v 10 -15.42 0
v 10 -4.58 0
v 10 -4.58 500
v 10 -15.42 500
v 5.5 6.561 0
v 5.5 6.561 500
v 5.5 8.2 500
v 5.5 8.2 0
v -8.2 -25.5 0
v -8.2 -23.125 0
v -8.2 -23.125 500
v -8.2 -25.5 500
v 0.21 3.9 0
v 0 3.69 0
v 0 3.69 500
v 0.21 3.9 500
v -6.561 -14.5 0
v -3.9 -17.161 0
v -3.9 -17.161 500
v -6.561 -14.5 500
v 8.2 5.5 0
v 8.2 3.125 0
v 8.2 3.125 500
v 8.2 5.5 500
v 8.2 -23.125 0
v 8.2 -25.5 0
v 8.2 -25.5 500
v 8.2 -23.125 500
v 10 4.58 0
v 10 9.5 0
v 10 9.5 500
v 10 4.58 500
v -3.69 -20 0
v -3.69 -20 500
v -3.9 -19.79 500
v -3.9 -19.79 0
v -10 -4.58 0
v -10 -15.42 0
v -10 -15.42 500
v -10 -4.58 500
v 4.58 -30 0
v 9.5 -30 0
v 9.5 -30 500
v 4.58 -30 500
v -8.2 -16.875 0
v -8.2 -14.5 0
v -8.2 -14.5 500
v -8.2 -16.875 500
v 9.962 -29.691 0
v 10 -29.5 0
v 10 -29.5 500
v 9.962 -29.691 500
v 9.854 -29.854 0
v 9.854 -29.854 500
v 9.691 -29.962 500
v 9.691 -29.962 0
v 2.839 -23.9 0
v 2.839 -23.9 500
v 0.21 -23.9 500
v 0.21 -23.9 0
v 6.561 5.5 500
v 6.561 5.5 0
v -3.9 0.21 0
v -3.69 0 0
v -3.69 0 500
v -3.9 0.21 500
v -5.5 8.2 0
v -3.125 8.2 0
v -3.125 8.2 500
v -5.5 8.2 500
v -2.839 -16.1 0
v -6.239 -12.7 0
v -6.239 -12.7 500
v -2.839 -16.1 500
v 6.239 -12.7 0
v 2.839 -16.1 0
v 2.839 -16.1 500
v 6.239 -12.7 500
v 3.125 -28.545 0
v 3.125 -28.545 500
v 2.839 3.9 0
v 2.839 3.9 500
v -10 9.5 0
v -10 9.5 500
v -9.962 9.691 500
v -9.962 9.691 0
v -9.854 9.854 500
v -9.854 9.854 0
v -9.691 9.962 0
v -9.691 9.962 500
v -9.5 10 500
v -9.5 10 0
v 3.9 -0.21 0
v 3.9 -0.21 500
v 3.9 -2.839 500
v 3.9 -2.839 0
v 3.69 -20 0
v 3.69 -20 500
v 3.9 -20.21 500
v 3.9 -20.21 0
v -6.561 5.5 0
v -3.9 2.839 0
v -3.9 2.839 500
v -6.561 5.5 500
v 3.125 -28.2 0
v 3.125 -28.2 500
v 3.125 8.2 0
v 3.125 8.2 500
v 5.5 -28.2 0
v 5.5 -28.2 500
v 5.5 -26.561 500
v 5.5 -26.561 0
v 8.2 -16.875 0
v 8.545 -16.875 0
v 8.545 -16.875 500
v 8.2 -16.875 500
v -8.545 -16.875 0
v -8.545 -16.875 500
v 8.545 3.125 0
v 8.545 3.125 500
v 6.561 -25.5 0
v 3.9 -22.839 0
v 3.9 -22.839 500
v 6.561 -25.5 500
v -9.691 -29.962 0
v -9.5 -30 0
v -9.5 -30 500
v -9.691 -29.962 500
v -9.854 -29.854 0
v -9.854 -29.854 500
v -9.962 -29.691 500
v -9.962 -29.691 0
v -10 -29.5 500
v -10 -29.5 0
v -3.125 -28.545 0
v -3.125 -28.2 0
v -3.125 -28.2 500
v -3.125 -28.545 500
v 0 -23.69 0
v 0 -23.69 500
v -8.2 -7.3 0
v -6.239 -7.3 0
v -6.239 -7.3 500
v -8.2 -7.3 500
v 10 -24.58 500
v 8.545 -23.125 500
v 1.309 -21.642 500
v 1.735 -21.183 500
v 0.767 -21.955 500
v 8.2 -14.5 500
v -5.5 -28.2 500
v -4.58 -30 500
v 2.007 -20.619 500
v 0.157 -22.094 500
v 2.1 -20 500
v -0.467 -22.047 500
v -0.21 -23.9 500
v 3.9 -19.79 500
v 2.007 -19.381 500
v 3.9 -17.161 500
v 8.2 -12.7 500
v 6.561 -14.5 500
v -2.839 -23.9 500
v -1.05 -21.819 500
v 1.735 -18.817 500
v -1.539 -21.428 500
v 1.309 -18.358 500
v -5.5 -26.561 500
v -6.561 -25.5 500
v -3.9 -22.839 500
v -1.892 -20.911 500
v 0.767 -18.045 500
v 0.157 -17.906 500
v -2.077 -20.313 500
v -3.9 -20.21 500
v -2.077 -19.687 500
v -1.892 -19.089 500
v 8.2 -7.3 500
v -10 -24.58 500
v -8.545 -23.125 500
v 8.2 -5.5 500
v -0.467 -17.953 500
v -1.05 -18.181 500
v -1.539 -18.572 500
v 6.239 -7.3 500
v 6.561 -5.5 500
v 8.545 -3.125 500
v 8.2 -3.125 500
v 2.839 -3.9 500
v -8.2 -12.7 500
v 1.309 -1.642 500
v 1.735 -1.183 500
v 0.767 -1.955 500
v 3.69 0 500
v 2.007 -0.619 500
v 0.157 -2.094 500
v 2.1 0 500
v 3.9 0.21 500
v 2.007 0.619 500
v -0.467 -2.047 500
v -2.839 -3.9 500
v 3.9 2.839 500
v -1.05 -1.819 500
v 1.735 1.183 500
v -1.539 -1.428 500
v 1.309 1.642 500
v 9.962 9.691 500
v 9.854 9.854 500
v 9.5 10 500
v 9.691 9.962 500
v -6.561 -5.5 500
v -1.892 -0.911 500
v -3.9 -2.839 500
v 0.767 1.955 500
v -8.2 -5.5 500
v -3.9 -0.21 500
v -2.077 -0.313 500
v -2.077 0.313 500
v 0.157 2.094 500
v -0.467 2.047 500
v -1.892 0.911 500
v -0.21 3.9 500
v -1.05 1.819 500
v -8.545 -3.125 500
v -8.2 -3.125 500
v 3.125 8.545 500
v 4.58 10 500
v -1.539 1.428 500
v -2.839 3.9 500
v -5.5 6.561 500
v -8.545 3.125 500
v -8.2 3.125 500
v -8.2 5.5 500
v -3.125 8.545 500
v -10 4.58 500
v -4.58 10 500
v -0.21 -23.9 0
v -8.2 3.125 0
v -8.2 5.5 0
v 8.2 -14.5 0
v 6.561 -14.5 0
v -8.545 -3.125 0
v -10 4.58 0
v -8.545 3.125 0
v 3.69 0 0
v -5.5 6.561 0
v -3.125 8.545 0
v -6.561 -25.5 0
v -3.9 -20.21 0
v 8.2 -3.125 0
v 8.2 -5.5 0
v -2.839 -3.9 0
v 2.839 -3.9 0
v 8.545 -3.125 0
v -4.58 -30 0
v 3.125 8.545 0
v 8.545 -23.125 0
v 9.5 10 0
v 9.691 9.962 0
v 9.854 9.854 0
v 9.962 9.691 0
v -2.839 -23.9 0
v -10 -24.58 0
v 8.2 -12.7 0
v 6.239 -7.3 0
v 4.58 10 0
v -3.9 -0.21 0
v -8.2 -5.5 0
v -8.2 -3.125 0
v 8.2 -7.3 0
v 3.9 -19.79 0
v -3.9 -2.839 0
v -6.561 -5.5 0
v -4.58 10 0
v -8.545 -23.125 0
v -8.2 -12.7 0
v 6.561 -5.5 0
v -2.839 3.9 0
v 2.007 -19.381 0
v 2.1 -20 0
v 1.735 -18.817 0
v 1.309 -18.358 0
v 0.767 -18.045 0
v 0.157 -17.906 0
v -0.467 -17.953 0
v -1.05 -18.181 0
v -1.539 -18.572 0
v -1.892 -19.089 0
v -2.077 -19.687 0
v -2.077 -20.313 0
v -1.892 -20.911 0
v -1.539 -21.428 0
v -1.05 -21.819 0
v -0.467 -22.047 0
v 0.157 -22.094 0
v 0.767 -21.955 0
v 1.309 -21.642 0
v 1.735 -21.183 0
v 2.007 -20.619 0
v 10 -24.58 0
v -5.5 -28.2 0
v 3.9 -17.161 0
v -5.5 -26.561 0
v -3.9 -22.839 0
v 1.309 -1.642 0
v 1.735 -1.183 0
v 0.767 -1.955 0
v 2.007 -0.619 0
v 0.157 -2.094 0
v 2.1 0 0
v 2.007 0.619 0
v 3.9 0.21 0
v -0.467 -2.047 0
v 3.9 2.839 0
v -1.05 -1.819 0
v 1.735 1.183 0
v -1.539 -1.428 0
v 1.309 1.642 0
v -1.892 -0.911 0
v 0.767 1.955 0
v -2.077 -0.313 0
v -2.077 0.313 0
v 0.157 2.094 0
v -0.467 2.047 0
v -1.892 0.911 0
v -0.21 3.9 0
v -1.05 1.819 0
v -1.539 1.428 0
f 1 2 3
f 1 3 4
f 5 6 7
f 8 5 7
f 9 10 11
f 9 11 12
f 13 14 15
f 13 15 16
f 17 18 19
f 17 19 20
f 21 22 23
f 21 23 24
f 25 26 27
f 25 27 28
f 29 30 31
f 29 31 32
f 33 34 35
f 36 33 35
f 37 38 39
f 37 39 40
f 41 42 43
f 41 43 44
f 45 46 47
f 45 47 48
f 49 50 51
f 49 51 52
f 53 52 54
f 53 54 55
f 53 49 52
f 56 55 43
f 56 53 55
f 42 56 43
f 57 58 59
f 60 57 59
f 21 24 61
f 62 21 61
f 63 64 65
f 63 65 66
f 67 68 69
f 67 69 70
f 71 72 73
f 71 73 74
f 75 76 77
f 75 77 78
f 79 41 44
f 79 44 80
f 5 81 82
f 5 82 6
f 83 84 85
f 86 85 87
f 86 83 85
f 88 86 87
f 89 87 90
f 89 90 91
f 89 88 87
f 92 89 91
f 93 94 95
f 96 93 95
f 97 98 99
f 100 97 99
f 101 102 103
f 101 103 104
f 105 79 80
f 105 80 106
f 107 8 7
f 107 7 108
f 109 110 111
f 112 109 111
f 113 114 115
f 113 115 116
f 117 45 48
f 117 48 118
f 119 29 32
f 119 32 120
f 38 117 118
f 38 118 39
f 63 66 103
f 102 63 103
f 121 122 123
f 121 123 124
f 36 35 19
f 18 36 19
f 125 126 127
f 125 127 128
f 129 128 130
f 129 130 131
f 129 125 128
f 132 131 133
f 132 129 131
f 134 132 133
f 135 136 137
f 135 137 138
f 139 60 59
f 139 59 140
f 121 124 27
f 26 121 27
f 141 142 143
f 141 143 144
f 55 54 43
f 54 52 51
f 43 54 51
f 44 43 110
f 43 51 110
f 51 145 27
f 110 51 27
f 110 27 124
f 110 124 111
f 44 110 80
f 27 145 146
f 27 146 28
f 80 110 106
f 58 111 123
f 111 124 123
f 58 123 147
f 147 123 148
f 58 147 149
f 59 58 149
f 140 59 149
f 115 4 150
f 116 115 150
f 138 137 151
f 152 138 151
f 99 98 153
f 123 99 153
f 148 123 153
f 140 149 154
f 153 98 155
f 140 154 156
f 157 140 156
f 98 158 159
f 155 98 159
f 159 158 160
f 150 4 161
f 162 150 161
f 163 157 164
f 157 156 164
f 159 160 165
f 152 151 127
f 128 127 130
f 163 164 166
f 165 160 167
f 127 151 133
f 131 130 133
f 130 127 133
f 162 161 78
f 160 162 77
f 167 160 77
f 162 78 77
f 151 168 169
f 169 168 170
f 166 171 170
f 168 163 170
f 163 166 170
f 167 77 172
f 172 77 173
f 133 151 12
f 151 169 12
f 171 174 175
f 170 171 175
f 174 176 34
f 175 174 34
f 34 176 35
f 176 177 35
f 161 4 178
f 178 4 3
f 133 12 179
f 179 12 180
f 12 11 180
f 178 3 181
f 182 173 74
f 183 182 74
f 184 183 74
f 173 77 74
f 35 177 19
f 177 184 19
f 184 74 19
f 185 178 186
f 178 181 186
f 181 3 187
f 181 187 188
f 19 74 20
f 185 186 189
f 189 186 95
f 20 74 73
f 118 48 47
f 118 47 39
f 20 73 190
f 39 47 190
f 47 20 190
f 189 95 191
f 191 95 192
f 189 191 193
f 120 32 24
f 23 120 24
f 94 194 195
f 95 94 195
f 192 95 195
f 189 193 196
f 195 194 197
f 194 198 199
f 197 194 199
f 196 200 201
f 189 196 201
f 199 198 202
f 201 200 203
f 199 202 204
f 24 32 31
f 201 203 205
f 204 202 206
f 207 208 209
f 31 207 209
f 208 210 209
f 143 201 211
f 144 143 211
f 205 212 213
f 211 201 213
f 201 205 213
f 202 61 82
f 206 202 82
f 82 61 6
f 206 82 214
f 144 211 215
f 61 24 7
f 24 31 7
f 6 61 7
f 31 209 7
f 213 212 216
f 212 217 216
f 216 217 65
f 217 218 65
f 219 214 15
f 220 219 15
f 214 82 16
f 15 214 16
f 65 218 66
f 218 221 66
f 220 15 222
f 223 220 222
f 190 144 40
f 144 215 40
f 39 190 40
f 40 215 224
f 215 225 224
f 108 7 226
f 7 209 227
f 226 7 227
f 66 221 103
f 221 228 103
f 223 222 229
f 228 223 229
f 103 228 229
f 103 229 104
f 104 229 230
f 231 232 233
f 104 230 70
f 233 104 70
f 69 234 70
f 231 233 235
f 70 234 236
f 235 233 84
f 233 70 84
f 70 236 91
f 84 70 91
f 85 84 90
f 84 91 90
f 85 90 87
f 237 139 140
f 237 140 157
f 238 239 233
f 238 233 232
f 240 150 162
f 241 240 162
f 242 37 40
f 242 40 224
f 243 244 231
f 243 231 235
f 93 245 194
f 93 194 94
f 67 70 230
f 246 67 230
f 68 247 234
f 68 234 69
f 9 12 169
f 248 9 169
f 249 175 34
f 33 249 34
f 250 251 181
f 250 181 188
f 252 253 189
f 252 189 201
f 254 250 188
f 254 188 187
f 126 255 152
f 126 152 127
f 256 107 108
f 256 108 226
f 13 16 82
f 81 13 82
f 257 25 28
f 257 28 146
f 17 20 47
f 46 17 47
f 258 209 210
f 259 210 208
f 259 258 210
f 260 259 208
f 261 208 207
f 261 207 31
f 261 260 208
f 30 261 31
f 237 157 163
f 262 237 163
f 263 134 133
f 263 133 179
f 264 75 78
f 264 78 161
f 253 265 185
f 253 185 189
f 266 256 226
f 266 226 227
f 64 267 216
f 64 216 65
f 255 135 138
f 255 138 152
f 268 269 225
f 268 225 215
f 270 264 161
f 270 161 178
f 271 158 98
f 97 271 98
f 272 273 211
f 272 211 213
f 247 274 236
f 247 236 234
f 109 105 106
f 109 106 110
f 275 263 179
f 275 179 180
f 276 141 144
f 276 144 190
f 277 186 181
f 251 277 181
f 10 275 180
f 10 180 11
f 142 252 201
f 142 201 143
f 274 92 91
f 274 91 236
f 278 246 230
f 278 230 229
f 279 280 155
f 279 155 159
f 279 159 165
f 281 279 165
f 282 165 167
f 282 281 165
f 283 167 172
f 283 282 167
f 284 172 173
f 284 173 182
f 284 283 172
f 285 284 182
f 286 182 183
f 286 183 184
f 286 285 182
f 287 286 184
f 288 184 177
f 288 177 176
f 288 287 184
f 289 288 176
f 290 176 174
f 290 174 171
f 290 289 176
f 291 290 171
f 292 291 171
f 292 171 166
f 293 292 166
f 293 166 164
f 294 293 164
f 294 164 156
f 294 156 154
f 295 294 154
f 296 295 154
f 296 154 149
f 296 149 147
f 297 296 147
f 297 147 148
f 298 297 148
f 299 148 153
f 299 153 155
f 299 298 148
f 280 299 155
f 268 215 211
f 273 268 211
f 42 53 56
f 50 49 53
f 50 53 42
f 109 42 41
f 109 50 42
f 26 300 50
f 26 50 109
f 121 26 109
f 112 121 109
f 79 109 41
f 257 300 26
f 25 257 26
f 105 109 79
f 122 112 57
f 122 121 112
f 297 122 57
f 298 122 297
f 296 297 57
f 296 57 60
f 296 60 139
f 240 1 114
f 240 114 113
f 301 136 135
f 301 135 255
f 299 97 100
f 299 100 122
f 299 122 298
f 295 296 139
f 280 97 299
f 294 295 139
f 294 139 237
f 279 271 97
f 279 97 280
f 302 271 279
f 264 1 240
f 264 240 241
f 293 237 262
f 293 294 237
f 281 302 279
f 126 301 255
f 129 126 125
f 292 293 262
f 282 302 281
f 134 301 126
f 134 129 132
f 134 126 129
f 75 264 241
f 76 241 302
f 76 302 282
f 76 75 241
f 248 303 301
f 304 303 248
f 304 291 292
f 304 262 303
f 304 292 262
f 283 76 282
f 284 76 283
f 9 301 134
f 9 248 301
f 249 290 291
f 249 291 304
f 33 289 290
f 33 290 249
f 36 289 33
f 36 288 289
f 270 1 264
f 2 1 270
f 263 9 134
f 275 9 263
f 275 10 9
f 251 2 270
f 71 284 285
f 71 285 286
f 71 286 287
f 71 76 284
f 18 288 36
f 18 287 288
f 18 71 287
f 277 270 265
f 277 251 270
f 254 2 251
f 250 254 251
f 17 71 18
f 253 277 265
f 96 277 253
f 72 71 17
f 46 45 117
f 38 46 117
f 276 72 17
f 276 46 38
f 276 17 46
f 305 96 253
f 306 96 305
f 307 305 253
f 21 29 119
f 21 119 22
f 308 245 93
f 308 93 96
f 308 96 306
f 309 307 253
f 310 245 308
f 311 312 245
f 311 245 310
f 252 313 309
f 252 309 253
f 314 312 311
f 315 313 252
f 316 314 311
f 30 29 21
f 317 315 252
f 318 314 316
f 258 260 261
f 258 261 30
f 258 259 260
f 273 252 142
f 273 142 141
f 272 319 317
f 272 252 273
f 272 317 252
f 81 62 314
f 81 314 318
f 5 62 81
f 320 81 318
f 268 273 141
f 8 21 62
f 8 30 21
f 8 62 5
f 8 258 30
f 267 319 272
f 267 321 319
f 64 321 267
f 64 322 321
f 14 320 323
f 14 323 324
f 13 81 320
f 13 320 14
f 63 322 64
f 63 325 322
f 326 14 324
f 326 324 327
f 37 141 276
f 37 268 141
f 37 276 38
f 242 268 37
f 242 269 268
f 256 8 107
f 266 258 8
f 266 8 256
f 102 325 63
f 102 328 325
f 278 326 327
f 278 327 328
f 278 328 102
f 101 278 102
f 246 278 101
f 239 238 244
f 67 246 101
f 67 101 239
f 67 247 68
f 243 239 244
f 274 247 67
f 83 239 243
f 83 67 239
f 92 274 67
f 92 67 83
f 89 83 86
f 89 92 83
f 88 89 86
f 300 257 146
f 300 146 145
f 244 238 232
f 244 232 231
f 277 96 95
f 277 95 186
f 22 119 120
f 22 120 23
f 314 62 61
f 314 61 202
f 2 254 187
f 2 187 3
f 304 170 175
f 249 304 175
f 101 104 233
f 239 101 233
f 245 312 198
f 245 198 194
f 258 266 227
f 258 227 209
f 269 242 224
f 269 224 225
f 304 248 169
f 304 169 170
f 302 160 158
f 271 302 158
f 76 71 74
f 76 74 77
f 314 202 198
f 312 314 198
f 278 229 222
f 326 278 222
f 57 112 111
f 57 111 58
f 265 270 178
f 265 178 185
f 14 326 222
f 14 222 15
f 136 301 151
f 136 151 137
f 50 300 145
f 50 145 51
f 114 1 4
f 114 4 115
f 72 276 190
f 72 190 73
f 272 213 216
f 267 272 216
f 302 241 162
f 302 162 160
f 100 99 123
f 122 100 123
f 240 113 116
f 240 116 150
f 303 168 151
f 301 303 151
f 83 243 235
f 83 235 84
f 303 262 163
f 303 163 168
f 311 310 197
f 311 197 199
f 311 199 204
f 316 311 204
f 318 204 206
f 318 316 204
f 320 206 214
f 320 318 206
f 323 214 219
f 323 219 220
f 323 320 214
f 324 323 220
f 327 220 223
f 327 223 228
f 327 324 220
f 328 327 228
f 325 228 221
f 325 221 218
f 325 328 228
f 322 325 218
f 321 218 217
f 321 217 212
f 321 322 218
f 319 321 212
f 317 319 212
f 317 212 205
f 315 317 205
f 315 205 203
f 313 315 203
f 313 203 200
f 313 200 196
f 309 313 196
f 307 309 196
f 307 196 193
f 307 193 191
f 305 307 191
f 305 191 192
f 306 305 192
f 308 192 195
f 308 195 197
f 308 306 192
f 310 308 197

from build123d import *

# Parameters (mm, degrees)
SKETCH1_R           = 2.1
BOSS_EXTRUDE1_DEPTH = 500


with BuildPart() as part:
    # Sketch1 → Boss-Extrude1 (new body)
    with BuildSketch(Plane.XY):
        with BuildLine():
            Line((3.69, 0), (3.9, -0.21))
            Line((3.9, -0.21), (3.9, -2.839339828))
            Line((3.9, -2.839339828), (6.560660172, -5.5))
            Line((6.560660172, -5.5), (8.2, -5.5))
            Line((8.2, -5.5), (8.2, -3.125))
            Line((8.2, -3.125), (8.545, -3.125))
            Line((8.545, -3.125), (10, -4.58))
            Line((10, -4.58), (10, -15.42))
            Line((10, -15.42), (8.545, -16.875))
            Line((8.545, -16.875), (8.2, -16.875))
            Line((8.2, -16.875), (8.2, -14.5))
            Line((8.2, -14.5), (6.560660172, -14.5))
            Line((6.560660172, -14.5), (3.9, -17.160660172))
            Line((3.9, -17.160660172), (3.9, -19.79))
            Line((3.9, -19.79), (3.69, -20))
            Line((3.69, -20), (3.9, -20.21))
            Line((3.9, -20.21), (3.9, -22.839339828))
            Line((3.9, -22.839339828), (6.560660172, -25.5))
            Line((6.560660172, -25.5), (8.2, -25.5))
            Line((8.2, -25.5), (8.2, -23.125))
            Line((8.2, -23.125), (8.545, -23.125))
            Line((8.545, -23.125), (10, -24.58))
            Line((10, -24.58), (10, -29.5))
            ThreePointArc((10, -29.5), (9.853553391, -29.853553391), (9.5, -30))
            Line((9.5, -30), (4.58, -30))
            Line((4.58, -30), (3.125, -28.545))
            Line((3.125, -28.545), (3.125, -28.2))
            Line((3.125, -28.2), (5.5, -28.2))
            Line((5.5, -28.2), (5.5, -26.560660172))
            Line((5.5, -26.560660172), (2.839339828, -23.9))
            Line((2.839339828, -23.9), (0.21, -23.9))
            Line((0.21, -23.9), (0, -23.69))
            Line((0, -23.69), (-0.21, -23.9))
            Line((-0.21, -23.9), (-2.839339828, -23.9))
            Line((-2.839339828, -23.9), (-5.5, -26.560660172))
            Line((-5.5, -26.560660172), (-5.5, -28.2))
            Line((-5.5, -28.2), (-3.125, -28.2))
            Line((-3.125, -28.2), (-3.125, -28.545))
            Line((-3.125, -28.545), (-4.58, -30))
            Line((-4.58, -30), (-9.5, -30))
            ThreePointArc((-9.5, -30), (-9.853553391, -29.853553391), (-10, -29.5))
            Line((-10, -29.5), (-10, -24.58))
            Line((-10, -24.58), (-8.545, -23.125))
            Line((-8.545, -23.125), (-8.2, -23.125))
            Line((-8.2, -23.125), (-8.2, -25.5))
            Line((-8.2, -25.5), (-6.560660172, -25.5))
            Line((-6.560660172, -25.5), (-3.9, -22.839339828))
            Line((-3.9, -22.839339828), (-3.9, -20.21))
            Line((-3.9, -20.21), (-3.69, -20))
            Line((-3.69, -20), (-3.9, -19.79))
            Line((-3.9, -19.79), (-3.9, -17.160660172))
            Line((-3.9, -17.160660172), (-6.560660172, -14.5))
            Line((-6.560660172, -14.5), (-8.2, -14.5))
            Line((-8.2, -14.5), (-8.2, -16.875))
            Line((-8.2, -16.875), (-8.545, -16.875))
            Line((-8.545, -16.875), (-10, -15.42))
            Line((-10, -15.42), (-10, -4.58))
            Line((-10, -4.58), (-8.545, -3.125))
            Line((-8.545, -3.125), (-8.2, -3.125))
            Line((-8.2, -3.125), (-8.2, -5.5))
            Line((-8.2, -5.5), (-6.560660172, -5.5))
            Line((-6.560660172, -5.5), (-3.9, -2.839339828))
            Line((-3.9, -2.839339828), (-3.9, -0.21))
            Line((-3.9, -0.21), (-3.69, 0))
            Line((-3.69, 0), (-3.9, 0.21))
            Line((-3.9, 0.21), (-3.9, 2.839339828))
            Line((-3.9, 2.839339828), (-6.560660172, 5.5))
            Line((-6.560660172, 5.5), (-8.2, 5.5))
            Line((-8.2, 5.5), (-8.2, 3.125))
            Line((-8.2, 3.125), (-8.545, 3.125))
            Line((-8.545, 3.125), (-10, 4.58))
            Line((-10, 4.58), (-10, 9.5))
            ThreePointArc((-10, 9.5), (-9.853553391, 9.853553391), (-9.5, 10))
            Line((-9.5, 10), (-4.58, 10))
            Line((-4.58, 10), (-3.125, 8.545))
            Line((-3.125, 8.545), (-3.125, 8.2))
            Line((-3.125, 8.2), (-5.5, 8.2))
            Line((-5.5, 8.2), (-5.5, 6.560660172))
            Line((-5.5, 6.560660172), (-2.839339828, 3.9))
            Line((-2.839339828, 3.9), (-0.21, 3.9))
            Line((-0.21, 3.9), (0, 3.69))
            Line((0, 3.69), (0.21, 3.9))
            Line((0.21, 3.9), (2.839339828, 3.9))
            Line((2.839339828, 3.9), (5.5, 6.560660172))
            Line((5.5, 6.560660172), (5.5, 8.2))
            Line((5.5, 8.2), (3.125, 8.2))
            Line((3.125, 8.2), (3.125, 8.545))
            Line((3.125, 8.545), (4.58, 10))
            Line((4.58, 10), (9.5, 10))
            ThreePointArc((9.5, 10), (9.853553391, 9.853553391), (10, 9.5))
            Line((10, 9.5), (10, 4.58))
            Line((10, 4.58), (8.545, 3.125))
            Line((8.545, 3.125), (8.2, 3.125))
            Line((8.2, 3.125), (8.2, 5.5))
            Line((8.2, 5.5), (6.560660172, 5.5))
            Line((6.560660172, 5.5), (3.9, 2.839339828))
            Line((3.9, 2.839339828), (3.9, 0.21))
            Line((3.9, 0.21), (3.69, 0))
        make_face()
        with Locations((0, -20)):
            Circle(SKETCH1_R, mode=Mode.SUBTRACT)
        Circle(SKETCH1_R, mode=Mode.SUBTRACT)
        Polygon((-8.2, -12.7), (-6.239339828, -12.7), (-2.839339828, -16.1), (2.839339828, -16.1), (6.239339828, -12.7), (8.2, -12.7), (8.2, -7.3), (6.239339828, -7.3), (2.839339828, -3.9), (-2.839339828, -3.9), (-6.239339828, -7.3), (-8.2, -7.3), align=None, mode=Mode.SUBTRACT)
    extrude(amount=BOSS_EXTRUDE1_DEPTH)


solid = part.part
